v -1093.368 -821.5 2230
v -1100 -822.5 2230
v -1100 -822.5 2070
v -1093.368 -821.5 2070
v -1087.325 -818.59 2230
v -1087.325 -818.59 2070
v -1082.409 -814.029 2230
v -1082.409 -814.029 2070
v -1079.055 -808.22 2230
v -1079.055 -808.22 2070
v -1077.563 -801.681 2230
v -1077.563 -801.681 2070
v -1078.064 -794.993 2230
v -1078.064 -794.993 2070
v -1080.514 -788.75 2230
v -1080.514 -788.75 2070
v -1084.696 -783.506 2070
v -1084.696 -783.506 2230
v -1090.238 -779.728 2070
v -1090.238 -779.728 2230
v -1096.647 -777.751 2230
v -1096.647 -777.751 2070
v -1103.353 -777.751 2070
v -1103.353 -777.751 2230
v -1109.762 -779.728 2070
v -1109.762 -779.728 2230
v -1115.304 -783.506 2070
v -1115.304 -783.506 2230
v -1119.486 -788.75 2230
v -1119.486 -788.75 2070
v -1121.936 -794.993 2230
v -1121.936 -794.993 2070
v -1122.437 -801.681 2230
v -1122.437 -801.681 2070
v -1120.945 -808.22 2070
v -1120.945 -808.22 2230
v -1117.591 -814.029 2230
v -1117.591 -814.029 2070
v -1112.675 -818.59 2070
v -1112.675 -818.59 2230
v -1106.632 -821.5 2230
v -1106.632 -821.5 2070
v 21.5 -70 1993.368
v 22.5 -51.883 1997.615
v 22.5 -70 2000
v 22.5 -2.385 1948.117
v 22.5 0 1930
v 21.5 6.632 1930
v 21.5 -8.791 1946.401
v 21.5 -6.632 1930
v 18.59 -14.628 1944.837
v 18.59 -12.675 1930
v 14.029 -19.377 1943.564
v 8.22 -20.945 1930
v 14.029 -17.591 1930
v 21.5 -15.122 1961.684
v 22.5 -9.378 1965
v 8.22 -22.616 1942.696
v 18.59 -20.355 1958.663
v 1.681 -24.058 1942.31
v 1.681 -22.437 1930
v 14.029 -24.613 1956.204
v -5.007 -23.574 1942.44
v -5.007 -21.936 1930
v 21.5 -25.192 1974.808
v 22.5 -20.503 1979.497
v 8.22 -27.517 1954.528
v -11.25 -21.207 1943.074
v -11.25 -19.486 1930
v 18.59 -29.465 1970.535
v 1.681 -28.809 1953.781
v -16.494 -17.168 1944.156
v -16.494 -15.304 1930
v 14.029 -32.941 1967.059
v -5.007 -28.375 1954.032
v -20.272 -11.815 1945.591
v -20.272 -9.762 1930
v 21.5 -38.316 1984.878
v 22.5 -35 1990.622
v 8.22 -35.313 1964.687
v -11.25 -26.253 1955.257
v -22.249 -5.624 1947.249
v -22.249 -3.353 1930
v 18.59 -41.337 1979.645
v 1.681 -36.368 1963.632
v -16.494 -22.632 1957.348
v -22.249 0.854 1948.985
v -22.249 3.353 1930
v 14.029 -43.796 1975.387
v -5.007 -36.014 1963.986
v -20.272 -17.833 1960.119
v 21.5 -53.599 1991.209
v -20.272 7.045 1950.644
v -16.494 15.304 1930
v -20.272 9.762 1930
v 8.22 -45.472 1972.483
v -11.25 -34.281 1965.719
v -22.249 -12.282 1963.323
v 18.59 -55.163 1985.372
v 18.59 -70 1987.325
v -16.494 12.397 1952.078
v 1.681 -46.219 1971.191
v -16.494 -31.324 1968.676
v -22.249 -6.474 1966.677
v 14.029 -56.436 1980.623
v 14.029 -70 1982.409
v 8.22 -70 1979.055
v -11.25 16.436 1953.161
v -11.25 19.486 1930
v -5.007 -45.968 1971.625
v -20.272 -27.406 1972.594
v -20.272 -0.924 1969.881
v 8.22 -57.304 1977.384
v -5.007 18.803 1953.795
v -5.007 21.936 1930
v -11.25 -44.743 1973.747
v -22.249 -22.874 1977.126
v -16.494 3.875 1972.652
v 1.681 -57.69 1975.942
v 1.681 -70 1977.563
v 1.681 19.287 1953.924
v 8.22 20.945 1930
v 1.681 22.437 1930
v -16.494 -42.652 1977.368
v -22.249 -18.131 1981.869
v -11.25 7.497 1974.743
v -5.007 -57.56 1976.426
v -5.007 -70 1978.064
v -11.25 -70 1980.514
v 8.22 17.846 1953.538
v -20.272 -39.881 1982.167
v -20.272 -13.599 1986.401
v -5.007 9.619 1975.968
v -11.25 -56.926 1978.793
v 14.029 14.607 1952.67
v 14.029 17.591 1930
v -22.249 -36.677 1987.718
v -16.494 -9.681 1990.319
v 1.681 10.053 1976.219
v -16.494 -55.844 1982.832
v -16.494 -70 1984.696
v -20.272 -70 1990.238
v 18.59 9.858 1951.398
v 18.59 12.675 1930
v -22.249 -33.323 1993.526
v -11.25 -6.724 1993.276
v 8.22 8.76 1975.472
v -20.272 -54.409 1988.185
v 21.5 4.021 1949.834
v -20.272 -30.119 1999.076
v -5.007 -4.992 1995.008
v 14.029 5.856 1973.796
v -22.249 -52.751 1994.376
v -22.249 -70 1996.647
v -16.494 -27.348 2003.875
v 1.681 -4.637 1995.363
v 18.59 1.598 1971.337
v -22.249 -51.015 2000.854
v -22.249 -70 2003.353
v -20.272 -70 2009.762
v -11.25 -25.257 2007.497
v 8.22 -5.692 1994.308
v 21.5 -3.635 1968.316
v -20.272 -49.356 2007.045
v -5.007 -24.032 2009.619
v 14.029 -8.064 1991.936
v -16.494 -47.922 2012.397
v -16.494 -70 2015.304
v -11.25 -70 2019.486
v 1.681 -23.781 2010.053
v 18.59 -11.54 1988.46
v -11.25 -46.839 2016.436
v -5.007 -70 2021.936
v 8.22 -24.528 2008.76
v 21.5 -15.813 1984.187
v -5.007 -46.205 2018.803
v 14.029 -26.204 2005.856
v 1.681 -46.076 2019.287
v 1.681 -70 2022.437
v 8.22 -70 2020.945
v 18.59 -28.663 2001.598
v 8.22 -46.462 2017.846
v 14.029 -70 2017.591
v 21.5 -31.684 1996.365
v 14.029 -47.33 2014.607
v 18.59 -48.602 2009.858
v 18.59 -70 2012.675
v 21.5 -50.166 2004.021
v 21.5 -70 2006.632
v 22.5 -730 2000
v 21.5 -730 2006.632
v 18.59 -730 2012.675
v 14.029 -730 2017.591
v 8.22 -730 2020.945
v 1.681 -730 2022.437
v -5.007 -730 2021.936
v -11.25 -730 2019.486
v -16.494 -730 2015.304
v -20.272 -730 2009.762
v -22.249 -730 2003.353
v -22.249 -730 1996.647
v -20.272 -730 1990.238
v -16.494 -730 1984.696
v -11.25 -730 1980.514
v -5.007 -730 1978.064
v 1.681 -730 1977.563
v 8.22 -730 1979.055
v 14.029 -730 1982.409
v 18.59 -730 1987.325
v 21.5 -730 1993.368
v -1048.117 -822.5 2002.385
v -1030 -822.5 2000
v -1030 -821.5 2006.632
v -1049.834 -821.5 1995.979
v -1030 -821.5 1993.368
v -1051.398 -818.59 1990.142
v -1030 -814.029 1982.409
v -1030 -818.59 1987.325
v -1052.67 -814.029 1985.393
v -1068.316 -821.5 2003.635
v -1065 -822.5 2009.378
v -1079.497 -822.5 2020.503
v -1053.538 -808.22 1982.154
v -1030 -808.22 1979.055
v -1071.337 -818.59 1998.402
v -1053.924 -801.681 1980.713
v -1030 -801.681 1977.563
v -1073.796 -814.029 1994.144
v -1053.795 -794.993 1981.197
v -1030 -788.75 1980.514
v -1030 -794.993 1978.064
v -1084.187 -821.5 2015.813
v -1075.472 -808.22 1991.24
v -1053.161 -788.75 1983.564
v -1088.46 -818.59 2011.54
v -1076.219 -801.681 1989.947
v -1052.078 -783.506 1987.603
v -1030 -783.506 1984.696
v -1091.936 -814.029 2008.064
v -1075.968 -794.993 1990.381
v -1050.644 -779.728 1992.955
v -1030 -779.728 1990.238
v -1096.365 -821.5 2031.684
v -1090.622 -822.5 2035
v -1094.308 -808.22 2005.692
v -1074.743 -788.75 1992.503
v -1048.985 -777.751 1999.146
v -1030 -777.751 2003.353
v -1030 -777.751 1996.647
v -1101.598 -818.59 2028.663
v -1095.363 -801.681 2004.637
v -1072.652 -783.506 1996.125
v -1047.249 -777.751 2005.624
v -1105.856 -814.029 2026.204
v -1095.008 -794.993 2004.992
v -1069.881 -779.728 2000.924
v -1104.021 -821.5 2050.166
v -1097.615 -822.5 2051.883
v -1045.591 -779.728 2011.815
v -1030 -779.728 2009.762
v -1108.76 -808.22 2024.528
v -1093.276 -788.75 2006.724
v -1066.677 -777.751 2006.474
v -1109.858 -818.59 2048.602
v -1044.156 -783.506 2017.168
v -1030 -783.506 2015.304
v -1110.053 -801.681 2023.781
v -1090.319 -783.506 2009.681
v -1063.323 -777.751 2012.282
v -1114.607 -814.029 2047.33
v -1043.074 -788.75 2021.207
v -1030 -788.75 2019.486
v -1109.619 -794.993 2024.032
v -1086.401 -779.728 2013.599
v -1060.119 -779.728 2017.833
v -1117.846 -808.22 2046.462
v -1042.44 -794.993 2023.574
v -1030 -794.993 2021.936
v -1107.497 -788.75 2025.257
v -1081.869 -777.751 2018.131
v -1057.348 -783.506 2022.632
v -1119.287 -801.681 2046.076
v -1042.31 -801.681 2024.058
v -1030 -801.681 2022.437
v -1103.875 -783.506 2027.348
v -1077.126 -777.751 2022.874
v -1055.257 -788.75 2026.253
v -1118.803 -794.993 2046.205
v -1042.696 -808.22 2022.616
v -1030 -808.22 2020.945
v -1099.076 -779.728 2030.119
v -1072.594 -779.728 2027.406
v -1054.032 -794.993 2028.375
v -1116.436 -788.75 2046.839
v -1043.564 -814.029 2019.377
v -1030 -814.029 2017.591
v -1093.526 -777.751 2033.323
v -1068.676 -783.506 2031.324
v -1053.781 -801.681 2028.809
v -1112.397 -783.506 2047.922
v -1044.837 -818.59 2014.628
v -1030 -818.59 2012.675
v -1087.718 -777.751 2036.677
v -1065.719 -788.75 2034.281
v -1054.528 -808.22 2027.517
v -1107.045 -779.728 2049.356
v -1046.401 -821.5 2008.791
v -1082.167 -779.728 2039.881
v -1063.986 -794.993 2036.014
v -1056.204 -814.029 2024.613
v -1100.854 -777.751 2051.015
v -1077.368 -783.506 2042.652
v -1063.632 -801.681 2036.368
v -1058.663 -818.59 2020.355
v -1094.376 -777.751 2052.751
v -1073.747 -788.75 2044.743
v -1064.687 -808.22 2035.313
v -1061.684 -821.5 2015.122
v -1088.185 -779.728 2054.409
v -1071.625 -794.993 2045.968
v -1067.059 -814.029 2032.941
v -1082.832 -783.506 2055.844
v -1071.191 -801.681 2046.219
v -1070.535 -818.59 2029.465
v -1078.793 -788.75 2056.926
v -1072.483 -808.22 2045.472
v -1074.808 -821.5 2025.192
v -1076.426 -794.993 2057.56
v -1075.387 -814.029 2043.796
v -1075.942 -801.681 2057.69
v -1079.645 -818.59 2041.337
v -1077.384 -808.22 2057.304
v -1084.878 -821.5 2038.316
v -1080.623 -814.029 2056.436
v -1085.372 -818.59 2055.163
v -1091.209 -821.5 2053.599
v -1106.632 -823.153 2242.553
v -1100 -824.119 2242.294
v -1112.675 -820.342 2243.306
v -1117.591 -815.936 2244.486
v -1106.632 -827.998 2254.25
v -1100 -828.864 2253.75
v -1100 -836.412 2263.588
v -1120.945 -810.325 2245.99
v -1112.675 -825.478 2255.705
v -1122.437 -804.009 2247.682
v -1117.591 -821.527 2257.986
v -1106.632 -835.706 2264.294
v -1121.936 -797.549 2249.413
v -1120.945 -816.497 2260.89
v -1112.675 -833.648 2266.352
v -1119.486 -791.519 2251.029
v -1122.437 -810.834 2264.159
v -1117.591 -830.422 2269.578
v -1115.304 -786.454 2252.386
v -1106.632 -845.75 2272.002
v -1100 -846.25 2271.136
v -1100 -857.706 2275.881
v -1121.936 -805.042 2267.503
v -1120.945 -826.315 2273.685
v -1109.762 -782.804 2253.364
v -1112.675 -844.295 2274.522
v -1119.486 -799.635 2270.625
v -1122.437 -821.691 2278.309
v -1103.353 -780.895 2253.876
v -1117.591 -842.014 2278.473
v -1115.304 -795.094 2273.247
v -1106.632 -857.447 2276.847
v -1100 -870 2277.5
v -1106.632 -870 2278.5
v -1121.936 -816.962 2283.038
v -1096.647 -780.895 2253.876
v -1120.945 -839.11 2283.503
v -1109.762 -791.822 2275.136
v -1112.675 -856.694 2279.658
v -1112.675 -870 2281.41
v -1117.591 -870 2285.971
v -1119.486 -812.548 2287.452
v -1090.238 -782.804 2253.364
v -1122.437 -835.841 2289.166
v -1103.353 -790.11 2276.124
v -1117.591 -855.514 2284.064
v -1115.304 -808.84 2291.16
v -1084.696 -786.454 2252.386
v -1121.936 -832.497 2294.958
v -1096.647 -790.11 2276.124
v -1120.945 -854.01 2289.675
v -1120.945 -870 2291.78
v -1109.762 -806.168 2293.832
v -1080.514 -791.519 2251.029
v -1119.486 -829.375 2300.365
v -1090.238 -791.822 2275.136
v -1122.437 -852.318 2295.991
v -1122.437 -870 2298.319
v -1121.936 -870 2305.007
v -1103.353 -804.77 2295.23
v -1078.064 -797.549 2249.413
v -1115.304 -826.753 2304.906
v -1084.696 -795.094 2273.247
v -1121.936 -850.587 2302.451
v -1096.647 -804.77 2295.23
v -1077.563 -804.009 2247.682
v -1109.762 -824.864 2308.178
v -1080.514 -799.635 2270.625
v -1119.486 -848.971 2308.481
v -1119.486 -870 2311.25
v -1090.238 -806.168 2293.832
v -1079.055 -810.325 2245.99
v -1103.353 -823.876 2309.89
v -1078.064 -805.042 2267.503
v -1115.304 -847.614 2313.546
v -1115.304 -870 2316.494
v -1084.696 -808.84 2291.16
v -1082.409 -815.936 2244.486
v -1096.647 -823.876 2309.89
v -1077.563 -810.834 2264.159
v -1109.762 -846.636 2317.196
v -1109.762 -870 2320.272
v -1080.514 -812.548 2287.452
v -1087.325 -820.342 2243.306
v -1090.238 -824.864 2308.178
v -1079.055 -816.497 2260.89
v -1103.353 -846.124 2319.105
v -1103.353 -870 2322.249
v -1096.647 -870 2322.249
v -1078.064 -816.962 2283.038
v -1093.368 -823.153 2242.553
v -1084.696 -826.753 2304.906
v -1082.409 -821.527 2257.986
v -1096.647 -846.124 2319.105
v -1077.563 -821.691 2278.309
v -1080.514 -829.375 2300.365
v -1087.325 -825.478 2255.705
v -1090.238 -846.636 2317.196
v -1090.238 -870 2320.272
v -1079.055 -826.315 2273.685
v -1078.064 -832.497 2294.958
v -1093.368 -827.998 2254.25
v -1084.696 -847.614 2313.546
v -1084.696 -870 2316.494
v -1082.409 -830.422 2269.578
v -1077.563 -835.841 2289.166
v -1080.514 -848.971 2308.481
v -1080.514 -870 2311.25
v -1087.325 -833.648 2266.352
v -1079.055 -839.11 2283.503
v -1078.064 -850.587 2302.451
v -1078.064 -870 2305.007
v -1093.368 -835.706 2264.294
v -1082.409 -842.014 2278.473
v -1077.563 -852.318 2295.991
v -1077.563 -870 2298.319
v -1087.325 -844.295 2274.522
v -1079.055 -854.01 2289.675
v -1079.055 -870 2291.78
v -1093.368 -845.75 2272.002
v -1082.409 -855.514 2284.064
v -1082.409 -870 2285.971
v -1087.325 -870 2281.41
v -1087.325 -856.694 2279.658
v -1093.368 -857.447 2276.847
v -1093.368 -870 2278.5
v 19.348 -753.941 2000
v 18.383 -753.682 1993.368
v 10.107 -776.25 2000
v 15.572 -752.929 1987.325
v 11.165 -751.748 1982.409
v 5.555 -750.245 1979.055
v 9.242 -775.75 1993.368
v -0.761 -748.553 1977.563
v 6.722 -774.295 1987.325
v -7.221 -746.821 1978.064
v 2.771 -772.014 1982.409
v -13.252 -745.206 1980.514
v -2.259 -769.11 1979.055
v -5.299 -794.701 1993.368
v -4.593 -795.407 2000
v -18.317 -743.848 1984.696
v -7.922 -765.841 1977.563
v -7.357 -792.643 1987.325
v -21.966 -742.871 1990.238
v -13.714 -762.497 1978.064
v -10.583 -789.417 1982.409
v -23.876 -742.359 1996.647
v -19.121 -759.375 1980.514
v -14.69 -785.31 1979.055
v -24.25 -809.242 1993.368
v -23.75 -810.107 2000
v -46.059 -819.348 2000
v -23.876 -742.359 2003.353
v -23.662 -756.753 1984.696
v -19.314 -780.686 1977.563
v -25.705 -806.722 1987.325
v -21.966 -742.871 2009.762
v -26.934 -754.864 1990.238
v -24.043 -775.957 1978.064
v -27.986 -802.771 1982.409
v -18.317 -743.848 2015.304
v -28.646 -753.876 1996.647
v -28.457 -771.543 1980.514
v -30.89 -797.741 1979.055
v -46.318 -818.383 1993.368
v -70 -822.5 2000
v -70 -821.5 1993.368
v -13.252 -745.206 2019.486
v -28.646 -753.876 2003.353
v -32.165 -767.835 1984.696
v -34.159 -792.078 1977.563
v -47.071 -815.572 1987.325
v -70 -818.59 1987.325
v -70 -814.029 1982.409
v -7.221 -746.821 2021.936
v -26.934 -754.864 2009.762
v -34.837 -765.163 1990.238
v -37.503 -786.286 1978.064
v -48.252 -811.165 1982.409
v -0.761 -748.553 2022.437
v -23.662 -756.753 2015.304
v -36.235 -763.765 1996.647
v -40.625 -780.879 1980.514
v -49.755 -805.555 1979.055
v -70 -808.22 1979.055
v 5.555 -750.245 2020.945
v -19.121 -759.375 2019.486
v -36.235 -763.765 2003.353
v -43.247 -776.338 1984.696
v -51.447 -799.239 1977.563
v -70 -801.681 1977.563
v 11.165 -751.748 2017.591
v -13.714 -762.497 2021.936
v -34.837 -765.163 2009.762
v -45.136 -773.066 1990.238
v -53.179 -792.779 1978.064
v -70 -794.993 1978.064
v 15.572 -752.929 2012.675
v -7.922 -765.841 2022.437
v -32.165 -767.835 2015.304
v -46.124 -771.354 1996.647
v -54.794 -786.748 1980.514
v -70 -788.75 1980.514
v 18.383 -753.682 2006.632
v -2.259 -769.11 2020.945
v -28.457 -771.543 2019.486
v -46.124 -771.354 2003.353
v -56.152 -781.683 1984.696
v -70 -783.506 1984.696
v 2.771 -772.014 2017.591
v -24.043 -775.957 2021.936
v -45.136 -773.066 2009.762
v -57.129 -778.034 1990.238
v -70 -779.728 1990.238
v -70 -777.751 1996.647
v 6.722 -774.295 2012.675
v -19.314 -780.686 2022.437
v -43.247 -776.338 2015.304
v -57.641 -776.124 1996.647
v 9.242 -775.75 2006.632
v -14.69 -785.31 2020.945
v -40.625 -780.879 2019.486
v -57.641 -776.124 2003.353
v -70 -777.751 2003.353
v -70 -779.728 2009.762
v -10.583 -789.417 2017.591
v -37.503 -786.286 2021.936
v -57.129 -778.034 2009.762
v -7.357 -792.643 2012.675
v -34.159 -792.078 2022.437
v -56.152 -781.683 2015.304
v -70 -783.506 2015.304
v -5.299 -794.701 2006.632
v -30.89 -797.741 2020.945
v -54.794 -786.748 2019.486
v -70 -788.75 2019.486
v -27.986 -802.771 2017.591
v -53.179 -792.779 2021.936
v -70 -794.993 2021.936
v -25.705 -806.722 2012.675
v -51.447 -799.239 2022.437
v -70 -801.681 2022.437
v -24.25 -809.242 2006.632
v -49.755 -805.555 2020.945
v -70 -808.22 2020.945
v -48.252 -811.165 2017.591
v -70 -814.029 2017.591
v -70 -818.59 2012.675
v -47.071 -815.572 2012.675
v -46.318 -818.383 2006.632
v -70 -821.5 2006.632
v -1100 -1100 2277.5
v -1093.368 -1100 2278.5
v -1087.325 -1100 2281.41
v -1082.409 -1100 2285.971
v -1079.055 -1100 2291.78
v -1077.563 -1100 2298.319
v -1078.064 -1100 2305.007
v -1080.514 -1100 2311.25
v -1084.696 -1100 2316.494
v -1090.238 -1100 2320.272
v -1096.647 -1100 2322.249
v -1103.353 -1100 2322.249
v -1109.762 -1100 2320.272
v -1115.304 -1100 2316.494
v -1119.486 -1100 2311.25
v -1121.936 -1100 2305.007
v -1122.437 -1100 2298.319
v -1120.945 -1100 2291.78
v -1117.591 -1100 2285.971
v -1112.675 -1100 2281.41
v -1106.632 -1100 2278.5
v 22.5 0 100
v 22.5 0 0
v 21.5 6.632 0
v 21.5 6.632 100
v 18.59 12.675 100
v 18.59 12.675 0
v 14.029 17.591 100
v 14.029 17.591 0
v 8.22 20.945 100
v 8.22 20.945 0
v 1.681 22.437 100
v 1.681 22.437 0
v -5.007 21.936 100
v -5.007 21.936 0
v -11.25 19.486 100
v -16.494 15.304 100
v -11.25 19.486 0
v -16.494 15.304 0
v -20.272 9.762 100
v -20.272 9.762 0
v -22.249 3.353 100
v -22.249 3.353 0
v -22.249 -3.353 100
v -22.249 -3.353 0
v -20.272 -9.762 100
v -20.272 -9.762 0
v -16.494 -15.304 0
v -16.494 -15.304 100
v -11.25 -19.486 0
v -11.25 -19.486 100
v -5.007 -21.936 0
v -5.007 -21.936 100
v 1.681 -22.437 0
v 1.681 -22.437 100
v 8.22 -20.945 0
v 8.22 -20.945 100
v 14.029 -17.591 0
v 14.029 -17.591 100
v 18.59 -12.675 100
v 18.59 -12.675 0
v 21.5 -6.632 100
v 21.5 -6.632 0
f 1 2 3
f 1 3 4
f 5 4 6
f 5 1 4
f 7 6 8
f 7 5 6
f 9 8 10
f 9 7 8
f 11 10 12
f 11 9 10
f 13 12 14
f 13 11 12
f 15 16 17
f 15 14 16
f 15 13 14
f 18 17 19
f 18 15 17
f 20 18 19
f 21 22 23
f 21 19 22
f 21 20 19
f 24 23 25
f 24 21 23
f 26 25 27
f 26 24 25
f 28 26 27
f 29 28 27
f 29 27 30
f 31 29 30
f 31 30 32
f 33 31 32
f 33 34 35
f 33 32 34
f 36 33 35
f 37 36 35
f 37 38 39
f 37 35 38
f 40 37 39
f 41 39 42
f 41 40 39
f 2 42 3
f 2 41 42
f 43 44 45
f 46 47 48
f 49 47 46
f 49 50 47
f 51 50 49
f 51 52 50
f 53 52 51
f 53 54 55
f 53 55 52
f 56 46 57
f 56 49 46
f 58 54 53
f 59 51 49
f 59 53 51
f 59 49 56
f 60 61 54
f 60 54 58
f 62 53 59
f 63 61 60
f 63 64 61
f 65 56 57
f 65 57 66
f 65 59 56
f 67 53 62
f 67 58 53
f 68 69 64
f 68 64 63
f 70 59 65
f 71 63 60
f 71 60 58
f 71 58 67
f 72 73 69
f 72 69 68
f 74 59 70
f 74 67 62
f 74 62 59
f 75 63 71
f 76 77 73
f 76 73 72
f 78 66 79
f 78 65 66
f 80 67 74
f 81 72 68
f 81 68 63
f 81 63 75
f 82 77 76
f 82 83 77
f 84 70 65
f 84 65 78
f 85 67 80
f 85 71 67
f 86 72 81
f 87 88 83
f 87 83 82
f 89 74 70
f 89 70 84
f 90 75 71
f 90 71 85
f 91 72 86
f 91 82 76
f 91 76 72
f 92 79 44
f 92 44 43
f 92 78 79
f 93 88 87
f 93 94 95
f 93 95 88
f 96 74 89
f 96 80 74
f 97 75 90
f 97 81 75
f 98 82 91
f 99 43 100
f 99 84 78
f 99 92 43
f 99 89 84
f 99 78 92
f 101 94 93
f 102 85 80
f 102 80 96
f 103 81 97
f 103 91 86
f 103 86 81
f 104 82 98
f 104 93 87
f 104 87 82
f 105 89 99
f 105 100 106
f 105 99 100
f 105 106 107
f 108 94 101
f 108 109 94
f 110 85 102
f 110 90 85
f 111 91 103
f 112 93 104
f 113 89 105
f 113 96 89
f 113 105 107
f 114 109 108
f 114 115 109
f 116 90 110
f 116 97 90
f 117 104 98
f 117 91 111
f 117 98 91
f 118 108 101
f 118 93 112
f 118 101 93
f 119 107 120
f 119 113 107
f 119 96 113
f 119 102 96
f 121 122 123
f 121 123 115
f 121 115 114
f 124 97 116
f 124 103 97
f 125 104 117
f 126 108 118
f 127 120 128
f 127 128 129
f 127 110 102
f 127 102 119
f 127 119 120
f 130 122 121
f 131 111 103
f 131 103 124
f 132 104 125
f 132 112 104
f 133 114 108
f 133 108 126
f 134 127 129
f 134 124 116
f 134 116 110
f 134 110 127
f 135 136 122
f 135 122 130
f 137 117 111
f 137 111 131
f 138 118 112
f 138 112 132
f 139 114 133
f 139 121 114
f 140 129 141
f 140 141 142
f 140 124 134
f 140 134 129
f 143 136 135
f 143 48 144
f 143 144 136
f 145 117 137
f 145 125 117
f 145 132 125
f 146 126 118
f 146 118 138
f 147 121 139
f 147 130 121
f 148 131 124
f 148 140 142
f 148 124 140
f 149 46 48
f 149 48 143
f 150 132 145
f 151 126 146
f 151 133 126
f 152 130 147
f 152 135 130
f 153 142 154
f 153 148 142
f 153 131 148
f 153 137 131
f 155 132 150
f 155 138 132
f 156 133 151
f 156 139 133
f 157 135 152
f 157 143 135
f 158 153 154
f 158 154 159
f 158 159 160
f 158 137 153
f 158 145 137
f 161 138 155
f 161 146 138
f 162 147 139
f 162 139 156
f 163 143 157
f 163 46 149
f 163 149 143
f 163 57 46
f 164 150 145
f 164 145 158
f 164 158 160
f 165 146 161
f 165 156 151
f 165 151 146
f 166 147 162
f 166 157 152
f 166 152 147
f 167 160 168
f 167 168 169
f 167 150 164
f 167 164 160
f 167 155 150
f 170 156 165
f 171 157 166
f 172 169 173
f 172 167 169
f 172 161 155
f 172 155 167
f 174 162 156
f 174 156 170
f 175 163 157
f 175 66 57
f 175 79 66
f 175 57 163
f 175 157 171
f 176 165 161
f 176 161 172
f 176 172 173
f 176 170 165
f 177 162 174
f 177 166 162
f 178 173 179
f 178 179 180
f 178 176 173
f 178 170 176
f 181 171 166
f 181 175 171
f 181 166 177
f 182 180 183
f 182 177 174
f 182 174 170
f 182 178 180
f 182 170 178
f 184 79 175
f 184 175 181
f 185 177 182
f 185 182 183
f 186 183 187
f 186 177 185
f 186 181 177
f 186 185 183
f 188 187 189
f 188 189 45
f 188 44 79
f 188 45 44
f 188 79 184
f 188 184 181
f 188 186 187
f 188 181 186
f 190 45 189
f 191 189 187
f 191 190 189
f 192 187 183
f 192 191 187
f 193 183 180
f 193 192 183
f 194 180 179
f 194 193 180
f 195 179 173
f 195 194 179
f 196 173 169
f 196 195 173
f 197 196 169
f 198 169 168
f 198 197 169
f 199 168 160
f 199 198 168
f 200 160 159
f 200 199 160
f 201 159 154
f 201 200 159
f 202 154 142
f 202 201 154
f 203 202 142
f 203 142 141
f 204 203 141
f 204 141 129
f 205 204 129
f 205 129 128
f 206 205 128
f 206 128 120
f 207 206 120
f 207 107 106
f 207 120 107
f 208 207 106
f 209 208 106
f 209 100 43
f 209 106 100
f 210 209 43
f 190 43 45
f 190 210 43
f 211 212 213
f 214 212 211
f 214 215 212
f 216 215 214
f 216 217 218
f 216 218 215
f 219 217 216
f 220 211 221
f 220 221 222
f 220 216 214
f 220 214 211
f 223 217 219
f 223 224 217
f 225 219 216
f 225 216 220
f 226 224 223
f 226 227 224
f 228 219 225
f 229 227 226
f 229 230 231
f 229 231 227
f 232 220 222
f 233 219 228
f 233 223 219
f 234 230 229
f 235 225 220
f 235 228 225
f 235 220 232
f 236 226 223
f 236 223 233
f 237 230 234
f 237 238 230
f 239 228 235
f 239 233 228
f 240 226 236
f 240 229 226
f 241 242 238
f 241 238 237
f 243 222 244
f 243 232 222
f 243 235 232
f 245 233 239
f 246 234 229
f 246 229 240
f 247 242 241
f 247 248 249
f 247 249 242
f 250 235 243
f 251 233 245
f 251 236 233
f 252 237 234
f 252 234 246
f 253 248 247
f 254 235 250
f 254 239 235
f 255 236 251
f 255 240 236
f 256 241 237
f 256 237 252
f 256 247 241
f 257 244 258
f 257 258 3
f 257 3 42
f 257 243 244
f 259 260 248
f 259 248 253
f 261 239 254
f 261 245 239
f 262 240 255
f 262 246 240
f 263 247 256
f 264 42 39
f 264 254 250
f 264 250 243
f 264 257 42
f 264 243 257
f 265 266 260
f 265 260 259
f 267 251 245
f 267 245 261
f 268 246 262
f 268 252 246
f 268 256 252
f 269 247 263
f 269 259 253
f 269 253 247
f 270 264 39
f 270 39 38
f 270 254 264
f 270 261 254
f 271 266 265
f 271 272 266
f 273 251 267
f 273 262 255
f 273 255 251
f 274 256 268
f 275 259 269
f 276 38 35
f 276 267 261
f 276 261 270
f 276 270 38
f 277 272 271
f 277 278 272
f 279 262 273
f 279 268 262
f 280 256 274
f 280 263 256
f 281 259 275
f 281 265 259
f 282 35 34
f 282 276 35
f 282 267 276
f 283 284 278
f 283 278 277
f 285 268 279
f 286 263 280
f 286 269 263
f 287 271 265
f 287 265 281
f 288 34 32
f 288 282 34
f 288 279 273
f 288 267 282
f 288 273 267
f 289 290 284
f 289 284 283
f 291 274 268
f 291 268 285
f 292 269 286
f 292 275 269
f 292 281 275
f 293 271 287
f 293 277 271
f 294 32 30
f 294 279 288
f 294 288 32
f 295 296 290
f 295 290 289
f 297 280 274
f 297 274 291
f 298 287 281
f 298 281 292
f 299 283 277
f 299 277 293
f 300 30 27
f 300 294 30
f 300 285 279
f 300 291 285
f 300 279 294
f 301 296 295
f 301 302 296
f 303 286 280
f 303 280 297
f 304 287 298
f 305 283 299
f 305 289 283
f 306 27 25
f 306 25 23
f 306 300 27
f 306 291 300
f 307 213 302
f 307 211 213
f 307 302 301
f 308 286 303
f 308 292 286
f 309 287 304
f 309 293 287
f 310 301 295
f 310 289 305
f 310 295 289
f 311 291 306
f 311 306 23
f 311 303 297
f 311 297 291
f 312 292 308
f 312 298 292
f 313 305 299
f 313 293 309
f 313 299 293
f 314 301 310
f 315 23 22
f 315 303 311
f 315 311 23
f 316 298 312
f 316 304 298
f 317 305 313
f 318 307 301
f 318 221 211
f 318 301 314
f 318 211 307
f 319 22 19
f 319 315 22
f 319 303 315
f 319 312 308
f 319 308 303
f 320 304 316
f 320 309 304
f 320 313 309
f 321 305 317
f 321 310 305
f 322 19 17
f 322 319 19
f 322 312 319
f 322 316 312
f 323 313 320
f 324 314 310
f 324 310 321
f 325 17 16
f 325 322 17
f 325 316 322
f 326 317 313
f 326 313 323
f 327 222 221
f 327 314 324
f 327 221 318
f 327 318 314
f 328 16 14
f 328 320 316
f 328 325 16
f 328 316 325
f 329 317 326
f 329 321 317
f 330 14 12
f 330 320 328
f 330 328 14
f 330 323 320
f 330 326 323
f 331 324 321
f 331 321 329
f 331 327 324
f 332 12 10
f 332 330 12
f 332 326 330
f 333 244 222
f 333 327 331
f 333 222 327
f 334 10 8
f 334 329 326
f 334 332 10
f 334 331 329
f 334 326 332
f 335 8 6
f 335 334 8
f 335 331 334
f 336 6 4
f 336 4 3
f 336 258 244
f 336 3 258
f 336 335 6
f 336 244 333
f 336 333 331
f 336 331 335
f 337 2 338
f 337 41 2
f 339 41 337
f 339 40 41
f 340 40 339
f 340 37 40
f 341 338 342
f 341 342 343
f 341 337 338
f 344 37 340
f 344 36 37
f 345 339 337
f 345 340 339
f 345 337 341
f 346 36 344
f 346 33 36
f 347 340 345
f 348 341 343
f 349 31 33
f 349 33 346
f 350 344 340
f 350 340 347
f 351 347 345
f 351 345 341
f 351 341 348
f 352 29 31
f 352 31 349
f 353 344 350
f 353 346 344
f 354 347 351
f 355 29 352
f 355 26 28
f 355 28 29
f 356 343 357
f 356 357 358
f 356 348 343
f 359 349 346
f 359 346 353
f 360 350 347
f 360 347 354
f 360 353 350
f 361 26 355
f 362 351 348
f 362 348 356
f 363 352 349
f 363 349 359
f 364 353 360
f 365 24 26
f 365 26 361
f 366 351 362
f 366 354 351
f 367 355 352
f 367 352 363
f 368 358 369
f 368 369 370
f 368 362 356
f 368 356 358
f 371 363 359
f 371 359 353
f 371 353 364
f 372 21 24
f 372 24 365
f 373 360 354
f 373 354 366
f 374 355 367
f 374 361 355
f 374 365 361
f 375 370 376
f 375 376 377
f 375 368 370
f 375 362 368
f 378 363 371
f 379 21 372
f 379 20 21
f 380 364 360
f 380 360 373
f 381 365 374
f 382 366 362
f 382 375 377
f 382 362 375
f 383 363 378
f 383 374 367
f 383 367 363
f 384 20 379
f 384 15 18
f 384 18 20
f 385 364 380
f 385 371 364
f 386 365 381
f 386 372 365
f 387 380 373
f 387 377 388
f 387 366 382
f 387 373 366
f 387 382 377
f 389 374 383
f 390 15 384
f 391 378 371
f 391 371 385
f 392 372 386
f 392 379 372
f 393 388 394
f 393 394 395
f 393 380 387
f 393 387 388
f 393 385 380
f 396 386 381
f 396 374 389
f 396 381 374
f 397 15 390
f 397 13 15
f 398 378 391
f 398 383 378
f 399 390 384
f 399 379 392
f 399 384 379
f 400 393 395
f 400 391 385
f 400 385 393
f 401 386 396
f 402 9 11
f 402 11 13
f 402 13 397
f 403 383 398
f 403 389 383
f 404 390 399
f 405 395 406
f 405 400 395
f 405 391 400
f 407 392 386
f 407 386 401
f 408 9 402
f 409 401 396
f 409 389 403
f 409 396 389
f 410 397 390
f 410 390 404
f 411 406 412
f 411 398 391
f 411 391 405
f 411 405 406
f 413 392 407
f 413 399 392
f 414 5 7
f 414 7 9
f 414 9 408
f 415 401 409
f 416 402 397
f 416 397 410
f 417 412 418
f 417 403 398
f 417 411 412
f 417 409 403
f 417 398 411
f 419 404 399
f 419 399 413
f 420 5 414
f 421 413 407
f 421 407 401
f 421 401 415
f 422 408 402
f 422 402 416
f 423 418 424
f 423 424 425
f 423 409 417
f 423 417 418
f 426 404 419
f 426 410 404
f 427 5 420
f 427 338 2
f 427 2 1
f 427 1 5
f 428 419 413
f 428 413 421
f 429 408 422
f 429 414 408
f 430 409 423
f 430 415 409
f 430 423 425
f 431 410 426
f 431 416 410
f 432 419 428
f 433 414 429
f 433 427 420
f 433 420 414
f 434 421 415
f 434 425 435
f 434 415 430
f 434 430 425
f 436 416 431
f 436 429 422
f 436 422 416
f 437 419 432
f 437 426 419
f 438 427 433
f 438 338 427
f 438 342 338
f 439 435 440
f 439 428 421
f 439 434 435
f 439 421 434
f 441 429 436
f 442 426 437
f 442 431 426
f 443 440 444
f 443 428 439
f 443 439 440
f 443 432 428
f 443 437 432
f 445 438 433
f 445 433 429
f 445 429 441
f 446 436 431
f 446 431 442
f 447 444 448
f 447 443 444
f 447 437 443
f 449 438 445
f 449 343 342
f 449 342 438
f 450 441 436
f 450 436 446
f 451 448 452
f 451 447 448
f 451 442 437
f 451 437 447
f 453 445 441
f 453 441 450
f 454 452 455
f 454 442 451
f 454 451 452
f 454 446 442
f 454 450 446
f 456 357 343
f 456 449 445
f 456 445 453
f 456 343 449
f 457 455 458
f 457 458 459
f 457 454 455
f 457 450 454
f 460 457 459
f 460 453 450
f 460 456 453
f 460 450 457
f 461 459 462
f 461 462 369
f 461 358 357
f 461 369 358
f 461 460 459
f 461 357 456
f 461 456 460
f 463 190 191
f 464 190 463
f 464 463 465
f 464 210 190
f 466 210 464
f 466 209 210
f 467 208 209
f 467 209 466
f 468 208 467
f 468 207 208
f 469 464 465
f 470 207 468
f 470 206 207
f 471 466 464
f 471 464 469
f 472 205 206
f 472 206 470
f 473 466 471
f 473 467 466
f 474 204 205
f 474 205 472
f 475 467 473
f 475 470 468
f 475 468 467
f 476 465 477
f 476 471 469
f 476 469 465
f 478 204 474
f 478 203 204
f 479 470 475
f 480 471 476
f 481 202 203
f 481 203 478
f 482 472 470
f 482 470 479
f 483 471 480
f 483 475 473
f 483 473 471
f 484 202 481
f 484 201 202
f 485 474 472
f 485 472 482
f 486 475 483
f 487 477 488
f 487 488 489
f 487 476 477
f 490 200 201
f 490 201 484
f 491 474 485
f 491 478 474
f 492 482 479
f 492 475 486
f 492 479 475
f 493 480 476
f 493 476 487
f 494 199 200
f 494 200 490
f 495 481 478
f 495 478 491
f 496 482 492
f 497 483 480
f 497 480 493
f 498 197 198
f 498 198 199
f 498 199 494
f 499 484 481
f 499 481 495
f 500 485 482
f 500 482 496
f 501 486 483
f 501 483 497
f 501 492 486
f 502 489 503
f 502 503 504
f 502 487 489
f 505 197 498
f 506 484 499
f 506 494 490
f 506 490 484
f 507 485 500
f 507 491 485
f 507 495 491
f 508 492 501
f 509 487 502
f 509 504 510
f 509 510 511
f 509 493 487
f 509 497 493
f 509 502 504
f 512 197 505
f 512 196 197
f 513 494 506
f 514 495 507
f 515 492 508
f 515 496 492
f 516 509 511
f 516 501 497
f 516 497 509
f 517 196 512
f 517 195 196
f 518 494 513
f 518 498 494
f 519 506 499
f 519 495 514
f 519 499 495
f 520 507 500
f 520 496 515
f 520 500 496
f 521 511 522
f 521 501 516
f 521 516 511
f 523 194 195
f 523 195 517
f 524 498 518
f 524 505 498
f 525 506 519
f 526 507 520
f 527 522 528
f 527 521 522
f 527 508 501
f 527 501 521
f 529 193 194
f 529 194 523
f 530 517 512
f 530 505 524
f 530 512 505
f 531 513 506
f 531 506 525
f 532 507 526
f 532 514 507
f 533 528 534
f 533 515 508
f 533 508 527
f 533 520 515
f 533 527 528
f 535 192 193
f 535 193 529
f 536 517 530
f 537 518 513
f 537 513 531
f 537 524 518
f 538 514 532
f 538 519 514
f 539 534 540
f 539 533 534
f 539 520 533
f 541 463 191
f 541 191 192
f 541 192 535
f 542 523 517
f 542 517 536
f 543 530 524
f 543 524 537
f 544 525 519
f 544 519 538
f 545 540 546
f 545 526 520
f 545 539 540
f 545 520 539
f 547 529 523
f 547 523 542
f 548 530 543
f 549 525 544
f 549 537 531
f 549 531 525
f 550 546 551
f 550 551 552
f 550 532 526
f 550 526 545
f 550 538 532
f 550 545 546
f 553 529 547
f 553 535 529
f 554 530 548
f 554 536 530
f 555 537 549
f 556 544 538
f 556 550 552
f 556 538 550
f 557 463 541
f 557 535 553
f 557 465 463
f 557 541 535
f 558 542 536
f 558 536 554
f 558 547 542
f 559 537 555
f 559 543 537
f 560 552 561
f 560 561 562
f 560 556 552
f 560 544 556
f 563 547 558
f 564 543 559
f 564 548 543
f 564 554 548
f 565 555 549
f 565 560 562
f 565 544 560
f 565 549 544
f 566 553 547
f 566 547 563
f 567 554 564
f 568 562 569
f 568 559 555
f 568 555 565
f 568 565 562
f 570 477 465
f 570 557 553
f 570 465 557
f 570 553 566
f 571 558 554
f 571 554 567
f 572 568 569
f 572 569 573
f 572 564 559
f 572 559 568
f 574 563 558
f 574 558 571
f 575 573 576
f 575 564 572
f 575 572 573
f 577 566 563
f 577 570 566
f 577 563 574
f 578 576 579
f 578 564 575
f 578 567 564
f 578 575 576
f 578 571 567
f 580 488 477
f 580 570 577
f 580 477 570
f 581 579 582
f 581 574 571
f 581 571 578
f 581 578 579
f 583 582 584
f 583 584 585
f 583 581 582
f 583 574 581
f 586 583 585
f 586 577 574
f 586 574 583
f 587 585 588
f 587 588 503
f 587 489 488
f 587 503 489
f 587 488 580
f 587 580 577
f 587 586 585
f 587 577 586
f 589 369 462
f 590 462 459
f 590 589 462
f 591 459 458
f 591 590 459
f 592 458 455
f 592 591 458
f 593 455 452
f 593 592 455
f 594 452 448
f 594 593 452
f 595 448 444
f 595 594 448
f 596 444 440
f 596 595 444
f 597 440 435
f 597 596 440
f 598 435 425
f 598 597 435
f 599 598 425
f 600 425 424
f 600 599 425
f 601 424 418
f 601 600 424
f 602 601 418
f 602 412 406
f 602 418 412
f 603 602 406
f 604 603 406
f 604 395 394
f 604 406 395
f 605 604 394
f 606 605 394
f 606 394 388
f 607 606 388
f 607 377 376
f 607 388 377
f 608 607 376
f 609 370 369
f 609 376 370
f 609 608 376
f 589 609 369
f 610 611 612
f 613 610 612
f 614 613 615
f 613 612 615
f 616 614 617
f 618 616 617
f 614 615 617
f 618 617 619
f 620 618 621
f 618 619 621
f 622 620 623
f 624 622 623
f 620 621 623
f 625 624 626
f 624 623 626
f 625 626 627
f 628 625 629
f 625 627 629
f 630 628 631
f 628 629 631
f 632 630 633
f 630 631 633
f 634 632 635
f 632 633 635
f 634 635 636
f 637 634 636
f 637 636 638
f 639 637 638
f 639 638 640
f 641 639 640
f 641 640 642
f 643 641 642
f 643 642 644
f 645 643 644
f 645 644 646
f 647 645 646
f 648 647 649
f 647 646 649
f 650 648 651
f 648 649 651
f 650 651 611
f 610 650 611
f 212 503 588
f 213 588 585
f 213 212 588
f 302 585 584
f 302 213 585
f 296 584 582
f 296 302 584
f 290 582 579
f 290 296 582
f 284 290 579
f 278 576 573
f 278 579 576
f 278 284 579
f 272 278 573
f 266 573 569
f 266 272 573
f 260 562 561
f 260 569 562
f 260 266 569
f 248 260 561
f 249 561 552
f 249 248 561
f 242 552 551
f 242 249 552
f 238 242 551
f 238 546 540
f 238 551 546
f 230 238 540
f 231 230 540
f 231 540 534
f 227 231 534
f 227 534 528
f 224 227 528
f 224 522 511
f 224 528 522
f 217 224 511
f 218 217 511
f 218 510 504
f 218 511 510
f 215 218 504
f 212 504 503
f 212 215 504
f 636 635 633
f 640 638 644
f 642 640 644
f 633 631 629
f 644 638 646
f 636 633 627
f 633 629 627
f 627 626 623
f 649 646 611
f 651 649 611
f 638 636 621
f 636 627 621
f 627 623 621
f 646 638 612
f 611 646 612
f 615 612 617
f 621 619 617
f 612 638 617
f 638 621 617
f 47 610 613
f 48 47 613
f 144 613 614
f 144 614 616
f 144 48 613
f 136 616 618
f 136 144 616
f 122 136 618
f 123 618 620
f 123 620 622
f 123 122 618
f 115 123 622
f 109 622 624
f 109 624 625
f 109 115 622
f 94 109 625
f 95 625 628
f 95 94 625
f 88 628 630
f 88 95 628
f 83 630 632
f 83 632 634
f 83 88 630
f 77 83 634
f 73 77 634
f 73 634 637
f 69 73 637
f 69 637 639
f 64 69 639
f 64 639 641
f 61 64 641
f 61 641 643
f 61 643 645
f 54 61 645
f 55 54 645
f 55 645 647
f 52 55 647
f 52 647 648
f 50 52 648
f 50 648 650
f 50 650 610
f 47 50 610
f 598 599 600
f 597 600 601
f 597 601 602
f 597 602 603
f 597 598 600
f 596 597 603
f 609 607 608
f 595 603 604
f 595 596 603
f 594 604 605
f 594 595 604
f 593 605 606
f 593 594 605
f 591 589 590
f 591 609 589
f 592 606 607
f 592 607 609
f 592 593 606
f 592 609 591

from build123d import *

# Parameters (mm, degrees)
CROQUIS1_R              = 22.5
SALIENTE_EXTRUIR1_DEPTH = 100
CROQUIS3_R              = 22.5


with BuildPart() as part:
    # Croquis1 → Saliente-Extruir1 (new body)
    with BuildSketch(Plane.XY):
        Circle(CROQUIS1_R)
    extrude(amount=SALIENTE_EXTRUIR1_DEPTH)

    # Barrer1: sweep along a curve in space
    with BuildLine() as barrer1_path:
        Line((0, 0, 100), (0, 0, 1930))
        ThreePointArc((0, 0, 1930), (0, -20.502525317, 1979.497474683), (0, -70, 2000))
        Line((0, -70, 2000), (0, -730, 2000))
        ThreePointArc((0, -730, 2000), (-20.502525317, -779.497474683, 2000), (-70, -800, 2000))
        Line((-70, -800, 2000), (-1030, -800, 2000))
        ThreePointArc((-1030, -800, 2000), (-1079.497474683, -800, 2020.502525317), (-1100, -800, 2070))
        Line((-1100, -800, 2070), (-1100, -800, 2230))
        ThreePointArc((-1100, -800, 2230), (-1100, -820.502525317, 2279.497474683), (-1100, -870, 2300))
        Line((-1100, -870, 2300), (-1100, -1100, 2300))
    # Croquis3 → Barrer1 (sweep)
    with BuildSketch(Plane.XY.offset(100)):
        Circle(CROQUIS3_R)
    sweep(path=barrer1_path.line)


solid = part.part
